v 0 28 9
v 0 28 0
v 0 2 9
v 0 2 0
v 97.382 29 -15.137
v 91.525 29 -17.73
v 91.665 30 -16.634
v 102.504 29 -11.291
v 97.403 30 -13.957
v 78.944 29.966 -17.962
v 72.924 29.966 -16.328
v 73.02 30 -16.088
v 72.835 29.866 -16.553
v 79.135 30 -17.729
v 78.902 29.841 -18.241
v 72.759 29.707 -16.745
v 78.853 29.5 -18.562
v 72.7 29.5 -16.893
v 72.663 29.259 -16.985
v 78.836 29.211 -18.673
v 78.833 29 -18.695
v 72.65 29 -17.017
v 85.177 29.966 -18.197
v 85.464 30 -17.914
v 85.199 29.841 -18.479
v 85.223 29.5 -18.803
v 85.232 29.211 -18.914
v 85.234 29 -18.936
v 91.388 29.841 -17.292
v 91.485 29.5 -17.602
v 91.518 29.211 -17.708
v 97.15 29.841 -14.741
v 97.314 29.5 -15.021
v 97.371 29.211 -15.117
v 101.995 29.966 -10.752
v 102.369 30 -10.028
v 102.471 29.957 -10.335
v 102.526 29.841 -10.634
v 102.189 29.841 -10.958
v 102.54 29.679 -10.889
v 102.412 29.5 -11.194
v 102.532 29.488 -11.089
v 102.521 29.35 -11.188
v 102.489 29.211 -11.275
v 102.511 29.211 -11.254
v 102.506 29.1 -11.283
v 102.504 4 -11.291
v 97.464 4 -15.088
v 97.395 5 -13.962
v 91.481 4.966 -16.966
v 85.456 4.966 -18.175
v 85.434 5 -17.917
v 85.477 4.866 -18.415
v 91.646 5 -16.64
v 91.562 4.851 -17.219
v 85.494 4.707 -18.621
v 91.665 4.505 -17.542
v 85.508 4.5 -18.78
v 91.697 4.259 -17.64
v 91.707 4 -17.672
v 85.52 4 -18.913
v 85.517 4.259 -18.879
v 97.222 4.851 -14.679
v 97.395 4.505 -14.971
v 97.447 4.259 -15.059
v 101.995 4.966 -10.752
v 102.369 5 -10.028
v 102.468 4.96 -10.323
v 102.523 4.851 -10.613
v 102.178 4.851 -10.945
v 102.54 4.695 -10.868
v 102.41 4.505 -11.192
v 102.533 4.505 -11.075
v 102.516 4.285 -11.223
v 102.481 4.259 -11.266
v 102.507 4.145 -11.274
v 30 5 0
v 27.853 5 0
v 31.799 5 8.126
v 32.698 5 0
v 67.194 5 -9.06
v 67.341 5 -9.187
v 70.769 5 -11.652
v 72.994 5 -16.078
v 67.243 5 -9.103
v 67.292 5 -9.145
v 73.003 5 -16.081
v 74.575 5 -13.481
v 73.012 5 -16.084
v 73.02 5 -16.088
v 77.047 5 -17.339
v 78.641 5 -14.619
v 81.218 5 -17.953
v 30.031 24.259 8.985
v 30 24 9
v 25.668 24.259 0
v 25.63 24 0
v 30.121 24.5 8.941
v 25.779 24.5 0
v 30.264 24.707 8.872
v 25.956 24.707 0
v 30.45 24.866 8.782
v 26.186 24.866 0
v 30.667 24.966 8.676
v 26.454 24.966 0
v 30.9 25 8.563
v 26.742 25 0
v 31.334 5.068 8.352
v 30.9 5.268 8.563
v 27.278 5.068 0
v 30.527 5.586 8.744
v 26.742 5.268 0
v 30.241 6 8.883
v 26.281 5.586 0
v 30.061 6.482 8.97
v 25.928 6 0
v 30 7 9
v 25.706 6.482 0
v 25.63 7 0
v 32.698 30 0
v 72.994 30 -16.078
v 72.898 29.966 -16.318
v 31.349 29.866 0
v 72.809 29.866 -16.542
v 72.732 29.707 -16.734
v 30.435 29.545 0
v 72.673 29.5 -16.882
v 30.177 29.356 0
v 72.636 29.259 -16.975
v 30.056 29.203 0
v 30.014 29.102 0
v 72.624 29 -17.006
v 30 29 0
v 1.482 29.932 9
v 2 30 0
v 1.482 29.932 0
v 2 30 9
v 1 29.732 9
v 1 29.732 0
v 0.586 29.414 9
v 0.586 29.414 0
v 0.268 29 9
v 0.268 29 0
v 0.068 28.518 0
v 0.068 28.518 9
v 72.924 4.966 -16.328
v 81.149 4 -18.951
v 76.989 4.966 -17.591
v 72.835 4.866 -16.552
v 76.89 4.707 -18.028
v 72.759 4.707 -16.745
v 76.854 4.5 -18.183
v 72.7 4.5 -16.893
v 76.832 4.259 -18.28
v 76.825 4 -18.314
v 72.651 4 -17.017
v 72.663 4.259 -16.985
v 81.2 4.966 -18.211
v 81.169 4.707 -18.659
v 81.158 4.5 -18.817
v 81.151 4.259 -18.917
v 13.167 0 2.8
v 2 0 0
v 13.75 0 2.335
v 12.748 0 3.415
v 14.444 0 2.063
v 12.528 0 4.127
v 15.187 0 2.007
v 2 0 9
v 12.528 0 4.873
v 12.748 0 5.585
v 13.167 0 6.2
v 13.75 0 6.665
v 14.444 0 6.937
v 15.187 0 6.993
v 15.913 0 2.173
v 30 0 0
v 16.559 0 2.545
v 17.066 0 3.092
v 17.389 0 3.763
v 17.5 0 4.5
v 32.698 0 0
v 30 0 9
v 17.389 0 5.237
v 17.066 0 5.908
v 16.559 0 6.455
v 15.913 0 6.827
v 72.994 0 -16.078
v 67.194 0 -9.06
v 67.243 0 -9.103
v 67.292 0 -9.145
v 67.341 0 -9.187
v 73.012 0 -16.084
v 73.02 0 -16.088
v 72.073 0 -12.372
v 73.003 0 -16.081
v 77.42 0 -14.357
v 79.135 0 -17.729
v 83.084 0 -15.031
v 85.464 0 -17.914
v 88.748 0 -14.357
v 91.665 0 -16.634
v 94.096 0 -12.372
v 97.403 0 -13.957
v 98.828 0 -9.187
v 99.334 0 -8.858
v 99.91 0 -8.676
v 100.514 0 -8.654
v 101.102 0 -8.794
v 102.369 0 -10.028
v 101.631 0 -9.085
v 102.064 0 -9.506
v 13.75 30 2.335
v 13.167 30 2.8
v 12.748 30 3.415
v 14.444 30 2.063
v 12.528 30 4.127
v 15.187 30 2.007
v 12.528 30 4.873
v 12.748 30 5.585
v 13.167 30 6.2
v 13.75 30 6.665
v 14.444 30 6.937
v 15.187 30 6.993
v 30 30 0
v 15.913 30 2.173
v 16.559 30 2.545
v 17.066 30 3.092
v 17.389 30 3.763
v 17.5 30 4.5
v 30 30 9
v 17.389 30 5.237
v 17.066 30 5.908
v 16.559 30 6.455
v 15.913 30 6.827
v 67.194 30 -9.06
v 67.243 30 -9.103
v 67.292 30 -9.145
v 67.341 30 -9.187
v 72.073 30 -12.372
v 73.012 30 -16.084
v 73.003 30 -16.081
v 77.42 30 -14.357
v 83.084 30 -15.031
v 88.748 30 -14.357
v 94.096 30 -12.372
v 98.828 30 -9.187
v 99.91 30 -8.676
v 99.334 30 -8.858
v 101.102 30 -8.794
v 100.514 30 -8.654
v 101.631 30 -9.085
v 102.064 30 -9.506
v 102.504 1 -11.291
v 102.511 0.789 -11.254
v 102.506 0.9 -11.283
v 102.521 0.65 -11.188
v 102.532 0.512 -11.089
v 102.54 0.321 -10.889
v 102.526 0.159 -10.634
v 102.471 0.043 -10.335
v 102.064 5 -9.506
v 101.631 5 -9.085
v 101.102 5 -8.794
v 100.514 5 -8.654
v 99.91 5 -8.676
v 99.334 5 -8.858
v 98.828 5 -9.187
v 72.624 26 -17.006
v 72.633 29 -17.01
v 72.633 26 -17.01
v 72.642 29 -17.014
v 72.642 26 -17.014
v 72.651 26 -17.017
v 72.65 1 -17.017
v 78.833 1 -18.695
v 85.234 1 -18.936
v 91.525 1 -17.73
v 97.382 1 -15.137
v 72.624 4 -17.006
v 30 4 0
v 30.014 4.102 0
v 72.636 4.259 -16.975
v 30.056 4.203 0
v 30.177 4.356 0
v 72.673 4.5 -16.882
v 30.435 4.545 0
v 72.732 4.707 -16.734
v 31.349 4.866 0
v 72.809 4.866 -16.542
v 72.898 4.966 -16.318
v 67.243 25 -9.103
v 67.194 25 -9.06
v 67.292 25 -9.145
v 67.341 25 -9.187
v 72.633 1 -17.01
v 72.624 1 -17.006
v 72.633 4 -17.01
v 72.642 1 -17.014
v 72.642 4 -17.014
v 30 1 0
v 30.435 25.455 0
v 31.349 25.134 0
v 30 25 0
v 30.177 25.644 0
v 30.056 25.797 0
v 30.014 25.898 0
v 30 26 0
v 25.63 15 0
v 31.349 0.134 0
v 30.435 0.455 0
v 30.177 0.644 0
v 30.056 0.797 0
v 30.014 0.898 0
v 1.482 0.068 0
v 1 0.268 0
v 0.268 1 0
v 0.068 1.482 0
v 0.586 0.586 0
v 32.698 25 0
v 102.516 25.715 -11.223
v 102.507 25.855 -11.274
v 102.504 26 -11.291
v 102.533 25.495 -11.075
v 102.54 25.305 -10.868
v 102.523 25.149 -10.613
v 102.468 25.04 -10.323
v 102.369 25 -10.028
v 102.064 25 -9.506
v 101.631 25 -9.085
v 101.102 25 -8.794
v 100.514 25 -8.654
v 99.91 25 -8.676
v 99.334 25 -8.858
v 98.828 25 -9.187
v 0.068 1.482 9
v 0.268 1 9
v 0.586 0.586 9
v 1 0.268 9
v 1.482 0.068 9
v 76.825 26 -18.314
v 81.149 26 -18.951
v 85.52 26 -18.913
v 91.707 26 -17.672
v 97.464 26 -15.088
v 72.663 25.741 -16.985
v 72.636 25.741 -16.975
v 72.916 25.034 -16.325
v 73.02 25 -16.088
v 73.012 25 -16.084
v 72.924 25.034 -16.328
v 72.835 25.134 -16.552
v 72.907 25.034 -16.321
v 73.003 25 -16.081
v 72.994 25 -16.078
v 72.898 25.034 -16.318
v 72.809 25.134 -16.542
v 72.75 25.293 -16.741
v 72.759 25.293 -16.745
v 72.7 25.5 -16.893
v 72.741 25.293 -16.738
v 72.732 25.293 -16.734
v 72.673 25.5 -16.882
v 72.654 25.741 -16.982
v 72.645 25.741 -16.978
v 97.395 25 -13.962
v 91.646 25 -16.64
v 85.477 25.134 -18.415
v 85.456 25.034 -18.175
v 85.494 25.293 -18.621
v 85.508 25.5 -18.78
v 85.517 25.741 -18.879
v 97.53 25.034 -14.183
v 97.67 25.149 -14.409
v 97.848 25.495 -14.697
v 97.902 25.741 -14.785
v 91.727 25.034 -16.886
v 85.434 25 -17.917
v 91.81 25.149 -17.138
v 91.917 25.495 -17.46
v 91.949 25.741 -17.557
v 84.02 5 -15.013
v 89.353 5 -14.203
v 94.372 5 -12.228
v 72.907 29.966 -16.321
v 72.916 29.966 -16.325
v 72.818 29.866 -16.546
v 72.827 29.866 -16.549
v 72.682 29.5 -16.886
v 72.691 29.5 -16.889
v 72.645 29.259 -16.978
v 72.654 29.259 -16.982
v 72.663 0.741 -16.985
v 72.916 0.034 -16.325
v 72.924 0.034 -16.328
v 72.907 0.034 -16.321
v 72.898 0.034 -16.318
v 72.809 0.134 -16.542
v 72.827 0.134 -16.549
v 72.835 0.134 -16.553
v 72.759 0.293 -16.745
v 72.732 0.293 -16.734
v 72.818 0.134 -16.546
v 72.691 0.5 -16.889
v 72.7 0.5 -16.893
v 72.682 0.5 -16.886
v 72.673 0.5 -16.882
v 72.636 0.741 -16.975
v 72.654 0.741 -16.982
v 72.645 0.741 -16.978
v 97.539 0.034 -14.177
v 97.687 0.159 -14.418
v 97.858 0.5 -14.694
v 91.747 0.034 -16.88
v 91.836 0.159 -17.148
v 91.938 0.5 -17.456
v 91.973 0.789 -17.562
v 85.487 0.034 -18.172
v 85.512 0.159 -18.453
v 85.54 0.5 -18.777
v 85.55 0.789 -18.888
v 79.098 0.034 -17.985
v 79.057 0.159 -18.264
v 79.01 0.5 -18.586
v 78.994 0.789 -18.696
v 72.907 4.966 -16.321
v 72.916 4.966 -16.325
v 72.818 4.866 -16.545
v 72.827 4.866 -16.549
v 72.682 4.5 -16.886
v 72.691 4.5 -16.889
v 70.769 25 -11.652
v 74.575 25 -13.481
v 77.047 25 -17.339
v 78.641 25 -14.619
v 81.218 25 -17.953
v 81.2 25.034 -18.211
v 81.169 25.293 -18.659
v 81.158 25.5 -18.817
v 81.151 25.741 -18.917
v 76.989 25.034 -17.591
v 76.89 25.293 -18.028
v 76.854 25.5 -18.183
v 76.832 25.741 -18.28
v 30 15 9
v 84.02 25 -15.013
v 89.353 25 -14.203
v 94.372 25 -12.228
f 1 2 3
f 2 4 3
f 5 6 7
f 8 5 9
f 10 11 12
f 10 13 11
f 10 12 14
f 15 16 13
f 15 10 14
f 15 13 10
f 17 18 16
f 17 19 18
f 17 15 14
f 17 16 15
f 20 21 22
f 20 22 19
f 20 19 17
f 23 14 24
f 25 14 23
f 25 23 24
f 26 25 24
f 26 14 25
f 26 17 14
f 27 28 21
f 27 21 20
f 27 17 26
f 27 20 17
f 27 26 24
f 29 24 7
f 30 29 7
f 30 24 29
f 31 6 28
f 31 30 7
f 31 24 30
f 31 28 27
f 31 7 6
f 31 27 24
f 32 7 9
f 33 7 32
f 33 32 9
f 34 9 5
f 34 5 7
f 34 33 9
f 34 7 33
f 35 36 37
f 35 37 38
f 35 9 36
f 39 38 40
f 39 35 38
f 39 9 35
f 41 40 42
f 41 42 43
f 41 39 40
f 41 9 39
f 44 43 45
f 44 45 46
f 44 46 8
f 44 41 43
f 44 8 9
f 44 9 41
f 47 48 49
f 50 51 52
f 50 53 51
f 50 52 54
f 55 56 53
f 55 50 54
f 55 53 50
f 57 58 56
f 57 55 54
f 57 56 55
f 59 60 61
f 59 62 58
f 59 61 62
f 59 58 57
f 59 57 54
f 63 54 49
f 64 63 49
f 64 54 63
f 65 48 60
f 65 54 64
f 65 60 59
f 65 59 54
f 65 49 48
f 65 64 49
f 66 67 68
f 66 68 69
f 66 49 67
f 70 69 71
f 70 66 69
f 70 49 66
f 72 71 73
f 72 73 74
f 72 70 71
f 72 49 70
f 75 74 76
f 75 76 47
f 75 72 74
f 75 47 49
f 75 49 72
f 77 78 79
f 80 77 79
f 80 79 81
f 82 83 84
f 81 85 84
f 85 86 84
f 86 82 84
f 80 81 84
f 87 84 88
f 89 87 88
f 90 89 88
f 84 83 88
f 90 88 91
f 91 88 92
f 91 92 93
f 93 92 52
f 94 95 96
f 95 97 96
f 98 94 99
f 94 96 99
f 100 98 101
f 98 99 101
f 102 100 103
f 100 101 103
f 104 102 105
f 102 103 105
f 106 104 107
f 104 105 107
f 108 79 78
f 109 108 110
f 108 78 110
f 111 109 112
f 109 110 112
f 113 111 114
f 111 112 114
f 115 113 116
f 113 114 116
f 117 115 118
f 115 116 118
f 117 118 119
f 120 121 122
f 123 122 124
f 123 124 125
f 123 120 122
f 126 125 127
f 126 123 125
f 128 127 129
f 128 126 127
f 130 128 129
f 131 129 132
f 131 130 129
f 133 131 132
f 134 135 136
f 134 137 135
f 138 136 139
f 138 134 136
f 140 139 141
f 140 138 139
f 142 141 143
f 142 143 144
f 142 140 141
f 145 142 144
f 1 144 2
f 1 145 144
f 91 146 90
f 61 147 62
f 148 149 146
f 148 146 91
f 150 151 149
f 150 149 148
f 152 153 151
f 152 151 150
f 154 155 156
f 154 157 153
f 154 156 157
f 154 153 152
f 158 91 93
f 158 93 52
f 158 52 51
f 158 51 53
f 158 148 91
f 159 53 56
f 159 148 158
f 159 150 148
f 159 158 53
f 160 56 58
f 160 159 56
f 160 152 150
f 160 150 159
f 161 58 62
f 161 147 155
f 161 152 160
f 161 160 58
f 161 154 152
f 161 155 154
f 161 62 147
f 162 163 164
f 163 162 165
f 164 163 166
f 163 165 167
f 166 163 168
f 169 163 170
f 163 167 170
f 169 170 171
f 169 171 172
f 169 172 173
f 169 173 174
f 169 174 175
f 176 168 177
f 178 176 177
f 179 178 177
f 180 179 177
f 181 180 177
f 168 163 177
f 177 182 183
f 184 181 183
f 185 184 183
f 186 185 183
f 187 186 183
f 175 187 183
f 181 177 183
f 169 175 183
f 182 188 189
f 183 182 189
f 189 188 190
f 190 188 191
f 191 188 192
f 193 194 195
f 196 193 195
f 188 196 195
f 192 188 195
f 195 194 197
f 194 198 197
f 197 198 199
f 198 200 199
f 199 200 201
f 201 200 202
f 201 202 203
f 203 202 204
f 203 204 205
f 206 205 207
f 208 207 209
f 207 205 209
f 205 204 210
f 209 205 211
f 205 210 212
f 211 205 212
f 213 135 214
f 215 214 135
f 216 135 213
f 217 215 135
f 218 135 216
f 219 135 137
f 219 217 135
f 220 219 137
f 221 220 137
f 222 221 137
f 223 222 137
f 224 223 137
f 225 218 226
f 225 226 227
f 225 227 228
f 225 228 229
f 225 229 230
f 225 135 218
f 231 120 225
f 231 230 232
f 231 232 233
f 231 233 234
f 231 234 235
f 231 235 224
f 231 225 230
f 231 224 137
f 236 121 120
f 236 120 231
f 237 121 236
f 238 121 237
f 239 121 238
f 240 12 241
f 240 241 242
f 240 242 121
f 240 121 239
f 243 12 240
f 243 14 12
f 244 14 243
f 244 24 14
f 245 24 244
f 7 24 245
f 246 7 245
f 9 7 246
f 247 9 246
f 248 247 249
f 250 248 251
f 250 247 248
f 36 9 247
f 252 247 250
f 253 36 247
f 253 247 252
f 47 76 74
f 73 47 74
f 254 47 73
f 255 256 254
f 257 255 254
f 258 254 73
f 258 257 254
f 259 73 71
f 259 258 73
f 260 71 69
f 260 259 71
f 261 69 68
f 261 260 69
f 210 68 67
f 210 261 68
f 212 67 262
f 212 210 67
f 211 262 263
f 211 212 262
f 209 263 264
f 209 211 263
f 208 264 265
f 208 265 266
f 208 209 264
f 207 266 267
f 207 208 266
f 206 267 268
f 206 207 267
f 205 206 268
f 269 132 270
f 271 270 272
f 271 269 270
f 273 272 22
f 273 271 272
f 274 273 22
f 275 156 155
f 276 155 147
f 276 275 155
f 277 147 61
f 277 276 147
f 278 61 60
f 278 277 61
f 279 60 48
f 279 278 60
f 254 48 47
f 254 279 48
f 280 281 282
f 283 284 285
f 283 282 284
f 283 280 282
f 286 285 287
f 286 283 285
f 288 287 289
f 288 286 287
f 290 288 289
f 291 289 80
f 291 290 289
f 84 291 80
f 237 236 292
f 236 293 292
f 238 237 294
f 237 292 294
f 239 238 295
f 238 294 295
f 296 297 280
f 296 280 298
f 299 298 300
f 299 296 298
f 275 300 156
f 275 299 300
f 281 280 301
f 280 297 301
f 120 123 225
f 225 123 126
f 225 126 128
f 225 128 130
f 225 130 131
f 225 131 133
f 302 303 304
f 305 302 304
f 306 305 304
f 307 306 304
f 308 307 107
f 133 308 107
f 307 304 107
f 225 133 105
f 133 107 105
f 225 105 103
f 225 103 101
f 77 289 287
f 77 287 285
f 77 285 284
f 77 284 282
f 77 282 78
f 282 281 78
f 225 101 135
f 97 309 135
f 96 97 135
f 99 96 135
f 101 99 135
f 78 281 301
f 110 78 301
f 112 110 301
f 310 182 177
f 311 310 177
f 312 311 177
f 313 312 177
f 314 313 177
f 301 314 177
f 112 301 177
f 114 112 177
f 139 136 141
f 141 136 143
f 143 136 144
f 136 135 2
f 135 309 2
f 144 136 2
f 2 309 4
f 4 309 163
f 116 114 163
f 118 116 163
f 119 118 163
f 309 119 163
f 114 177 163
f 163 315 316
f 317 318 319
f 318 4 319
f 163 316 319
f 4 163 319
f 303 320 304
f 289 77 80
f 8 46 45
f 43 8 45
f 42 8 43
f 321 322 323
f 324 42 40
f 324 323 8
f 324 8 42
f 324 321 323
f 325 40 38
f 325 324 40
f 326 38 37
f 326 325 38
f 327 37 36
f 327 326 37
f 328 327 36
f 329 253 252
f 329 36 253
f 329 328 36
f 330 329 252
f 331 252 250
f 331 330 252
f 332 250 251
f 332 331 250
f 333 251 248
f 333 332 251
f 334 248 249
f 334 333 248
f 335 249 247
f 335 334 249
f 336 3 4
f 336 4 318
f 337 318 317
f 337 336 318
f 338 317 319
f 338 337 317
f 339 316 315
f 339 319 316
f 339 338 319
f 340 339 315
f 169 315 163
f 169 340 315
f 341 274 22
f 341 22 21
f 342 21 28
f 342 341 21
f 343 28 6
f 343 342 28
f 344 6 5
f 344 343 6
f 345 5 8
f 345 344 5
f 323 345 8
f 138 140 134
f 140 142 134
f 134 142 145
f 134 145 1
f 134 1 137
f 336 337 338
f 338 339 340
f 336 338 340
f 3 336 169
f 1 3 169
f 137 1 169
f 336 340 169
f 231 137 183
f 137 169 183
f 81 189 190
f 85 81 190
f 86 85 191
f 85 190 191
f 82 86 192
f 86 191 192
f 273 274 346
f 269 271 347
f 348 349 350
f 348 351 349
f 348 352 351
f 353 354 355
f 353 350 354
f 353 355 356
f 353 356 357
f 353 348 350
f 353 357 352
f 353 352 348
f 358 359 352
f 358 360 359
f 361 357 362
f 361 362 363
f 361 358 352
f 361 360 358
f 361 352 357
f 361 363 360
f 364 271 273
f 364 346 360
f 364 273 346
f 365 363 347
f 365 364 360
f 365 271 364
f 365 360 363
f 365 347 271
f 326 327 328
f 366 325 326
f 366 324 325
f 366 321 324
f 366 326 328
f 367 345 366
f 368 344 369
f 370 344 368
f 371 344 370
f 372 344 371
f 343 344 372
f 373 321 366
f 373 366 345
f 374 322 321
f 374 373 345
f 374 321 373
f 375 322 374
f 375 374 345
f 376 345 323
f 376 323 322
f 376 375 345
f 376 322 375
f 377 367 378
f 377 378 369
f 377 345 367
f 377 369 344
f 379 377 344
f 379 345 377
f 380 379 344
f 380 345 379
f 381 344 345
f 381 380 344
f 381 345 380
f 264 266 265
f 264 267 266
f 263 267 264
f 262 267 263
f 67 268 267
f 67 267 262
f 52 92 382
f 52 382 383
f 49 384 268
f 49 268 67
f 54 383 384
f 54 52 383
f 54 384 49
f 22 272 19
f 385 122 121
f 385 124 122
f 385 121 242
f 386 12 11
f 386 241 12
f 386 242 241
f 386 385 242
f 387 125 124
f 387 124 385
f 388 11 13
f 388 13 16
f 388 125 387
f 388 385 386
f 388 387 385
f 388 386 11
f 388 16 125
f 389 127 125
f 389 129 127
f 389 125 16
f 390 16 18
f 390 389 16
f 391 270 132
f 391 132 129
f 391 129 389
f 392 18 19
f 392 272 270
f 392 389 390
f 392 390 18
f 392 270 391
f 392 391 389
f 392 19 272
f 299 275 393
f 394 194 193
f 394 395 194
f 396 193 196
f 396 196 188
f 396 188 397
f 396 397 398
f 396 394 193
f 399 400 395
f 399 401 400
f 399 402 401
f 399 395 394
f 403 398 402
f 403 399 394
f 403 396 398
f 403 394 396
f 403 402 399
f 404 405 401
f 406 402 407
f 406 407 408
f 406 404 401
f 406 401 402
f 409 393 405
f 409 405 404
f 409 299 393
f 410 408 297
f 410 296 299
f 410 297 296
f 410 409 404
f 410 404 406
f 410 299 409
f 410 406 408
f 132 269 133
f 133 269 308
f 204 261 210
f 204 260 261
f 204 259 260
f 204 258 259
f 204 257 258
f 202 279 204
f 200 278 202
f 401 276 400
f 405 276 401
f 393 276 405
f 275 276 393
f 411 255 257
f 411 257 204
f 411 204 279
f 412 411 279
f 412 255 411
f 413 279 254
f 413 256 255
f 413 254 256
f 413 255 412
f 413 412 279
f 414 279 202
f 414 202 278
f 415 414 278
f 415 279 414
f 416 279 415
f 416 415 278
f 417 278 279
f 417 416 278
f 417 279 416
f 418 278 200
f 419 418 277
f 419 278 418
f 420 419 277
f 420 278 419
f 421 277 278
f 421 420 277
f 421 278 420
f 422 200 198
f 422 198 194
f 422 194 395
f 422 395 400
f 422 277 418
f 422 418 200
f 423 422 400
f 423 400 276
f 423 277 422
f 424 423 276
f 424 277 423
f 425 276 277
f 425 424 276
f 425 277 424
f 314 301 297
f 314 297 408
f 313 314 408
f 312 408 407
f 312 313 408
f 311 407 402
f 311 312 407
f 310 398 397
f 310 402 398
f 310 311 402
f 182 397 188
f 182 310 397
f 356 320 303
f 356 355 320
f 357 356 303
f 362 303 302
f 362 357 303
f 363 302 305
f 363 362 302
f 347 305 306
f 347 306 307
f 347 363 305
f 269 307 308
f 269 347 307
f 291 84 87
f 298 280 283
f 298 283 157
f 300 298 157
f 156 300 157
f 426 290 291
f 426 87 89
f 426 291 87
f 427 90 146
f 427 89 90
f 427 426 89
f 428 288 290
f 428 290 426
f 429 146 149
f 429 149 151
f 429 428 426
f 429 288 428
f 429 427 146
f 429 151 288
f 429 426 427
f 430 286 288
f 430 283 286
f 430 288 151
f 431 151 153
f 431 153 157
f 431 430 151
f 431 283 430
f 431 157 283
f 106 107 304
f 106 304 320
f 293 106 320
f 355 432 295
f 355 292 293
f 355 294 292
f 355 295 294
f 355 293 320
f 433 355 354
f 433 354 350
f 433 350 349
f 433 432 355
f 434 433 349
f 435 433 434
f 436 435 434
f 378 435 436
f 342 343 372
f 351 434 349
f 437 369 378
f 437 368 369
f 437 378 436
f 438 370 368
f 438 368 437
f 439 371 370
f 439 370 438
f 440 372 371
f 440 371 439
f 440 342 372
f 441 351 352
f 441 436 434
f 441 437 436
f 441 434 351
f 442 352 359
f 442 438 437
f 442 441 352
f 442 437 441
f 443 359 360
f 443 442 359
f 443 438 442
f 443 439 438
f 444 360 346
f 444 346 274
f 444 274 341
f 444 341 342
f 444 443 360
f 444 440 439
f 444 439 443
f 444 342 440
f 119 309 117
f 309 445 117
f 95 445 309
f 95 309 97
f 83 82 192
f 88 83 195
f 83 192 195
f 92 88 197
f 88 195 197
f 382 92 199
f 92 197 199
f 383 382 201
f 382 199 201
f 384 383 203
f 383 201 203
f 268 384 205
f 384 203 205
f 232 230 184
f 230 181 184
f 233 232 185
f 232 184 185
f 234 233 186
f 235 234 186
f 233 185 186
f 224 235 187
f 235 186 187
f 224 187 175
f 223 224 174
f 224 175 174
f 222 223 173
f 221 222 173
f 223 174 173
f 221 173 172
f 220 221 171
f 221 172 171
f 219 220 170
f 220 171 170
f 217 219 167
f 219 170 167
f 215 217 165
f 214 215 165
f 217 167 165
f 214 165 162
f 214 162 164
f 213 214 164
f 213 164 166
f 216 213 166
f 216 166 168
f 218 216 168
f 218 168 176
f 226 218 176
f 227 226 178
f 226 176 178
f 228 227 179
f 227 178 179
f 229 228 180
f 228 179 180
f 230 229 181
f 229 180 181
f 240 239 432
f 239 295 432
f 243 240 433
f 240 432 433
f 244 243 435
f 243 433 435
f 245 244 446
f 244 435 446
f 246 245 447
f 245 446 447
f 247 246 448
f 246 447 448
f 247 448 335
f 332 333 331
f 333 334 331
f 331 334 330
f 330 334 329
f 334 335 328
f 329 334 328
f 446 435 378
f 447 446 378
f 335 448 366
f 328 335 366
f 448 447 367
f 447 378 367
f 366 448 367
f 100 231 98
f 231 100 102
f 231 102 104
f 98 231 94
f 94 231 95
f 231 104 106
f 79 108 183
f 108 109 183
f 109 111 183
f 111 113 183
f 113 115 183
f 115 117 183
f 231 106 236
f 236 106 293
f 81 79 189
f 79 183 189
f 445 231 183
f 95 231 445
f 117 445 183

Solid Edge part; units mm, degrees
sketch "Sketch1" plane through (0, 0, 0) normal (0, -1, 0) x (1, 0, 0)
  line L0 (30, 9) -> (67.1942, -9.0603)
  arc A0 (67.3406, -9.1875) -> (98.8277, -9.1875) centre (83.0842, 9.0978) ccw
  arc A1 (98.8277, -9.1875) -> (102.5044, -11.2909) centre (100.2937, -10.8901) cw
  arc A2 (72.6505, -17.0171) -> (102.5044, -11.2909) centre (83.092, 9.2313) ccw
  line L1 (72.6237, -17.0064) -> (30, 0)
  line L2 (30, 0) -> (0, 0)
  line L3 (0, 0) -> (0, 9)
  line L4 (0, 9) -> (30, 9)
  arc A3 (67.3406, -9.1875) -> (67.1942, -9.0603) centre (83, 9) cw
  arc A4 (72.6505, -17.0171) -> (72.6237, -17.0064) centre (83, 9) cw
extrude "Protrusion1" add sketch "Sketch1" against normal blind 30
sketch "Sketch2" plane through (48.5971, 15, -0.0302) normal (0.4367982, 0, 0.8995595) x (0, 1, 0)
  line L0 (-10, 20.6735) -> (-10, -53.4115)
  line L1 (0, 20.6735) -> (-10, 20.6735)
  line L2 (0, 20.6735) -> (10, 20.6735)
  line L3 (10, 20.6735) -> (10, -53.4115)
extrude "Recorte_Extrudado_1" cut sketch "Sketch2" along normal blind 140 material side at (63.322, 5.05, -7.1801)
sketch "Sketch3" plane through (48.5971, 15, -0.0302) normal (0.4367982, 0, 0.8995595) x (0, 1, 0)
  line L0 (10, 20.6735) -> (10, -53.4115)
  line L1 (0, 20.6735) -> (10, 20.6735)
  line L2 (0, 20.6735) -> (-10, 20.6735)
  line L3 (-10, 20.6735) -> (-10, -53.4115)
extrude "Recorte_Extrudado_2" cut sketch "Sketch3" against normal blind 100 material side at (63.322, 24.95, -7.1801)
fillet "Redondo_1" radius 2 3 edges at (27.8149, 5, 4.5) (0, 0, 4.5) (0, 30, 4.5)
fillet "Redondo_1" radius 1 1 edges at (27.8149, 25, 4.5)
sketch "Sketch4" plane through (0, 0, 0) normal (0, -1, 0) x (1, 0, 0)
  circle A0 centre (15, 4.5) radius 2.5
extrude "Recorte_Extrudado_3" cut sketch "Sketch4" against normal blind 100
fillet "Redondo_3" radius 1 12 edges at (51.3119, 30, -8.5032) (72.6371, 30, -17.0117) (88.4133, 30, -18.5119) (51.3119, 25, -8.5032) (72.6371, 25, -17.0117) (88.4133, 25, -18.5119) (51.3119, 5, -8.5032) (72.6371, 5, -17.0117) (88.4133, 5, -18.5119) (51.3119, 0, -8.5032) (72.6371, 0, -17.0117) (88.4133, 0, -18.5119)
